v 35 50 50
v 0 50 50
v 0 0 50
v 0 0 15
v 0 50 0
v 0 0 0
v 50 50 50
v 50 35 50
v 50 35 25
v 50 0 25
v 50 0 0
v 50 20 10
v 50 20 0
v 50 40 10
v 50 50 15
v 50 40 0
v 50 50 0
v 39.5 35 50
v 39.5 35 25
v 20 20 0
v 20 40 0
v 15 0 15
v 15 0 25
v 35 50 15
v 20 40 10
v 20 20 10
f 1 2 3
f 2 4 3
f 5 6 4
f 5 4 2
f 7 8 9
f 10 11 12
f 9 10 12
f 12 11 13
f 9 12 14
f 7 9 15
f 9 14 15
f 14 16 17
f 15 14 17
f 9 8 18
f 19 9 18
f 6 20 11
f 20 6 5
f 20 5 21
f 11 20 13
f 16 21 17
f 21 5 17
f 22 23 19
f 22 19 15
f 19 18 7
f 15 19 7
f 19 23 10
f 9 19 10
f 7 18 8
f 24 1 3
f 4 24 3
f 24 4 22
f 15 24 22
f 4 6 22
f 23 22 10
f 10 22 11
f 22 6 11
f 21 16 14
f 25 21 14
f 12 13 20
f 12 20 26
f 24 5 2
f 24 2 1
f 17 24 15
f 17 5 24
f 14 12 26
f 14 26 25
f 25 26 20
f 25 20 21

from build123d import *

# Parameters (mm, degrees)
F0_W     = 50
F0_H     = 50
F1_DEPTH = 50
F3_DEPTH = 35
F4_W     = 20
F4_H     = 10
F5_DEPTH = 30
F7_DEPTH = 25


with BuildPart() as f1:
    # F0 (on Top) → F1 (new body)
    with BuildSketch(Plane.XY):
        with Locations((25, 25)):
            Rectangle(F0_W, F0_H)
    extrude(amount=F1_DEPTH)

    # F2 (on face) → F3 (cut)
    with BuildSketch(Plane.XY.offset(50)):
        Polygon((15, 0), (50, 50), (35, 50), (0, 0), align=None)
    extrude(amount=-F3_DEPTH, mode=Mode.SUBTRACT)

    # F4 (on face) → F5 (cut)
    with BuildSketch(Plane.YZ.offset(50)):
        with Locations((30, 5)):
            Rectangle(F4_W, F4_H)
    extrude(amount=-F5_DEPTH, mode=Mode.SUBTRACT)

    # F6 (on face) → F7 (cut)
    with BuildSketch(Plane.XY.offset(50)):
        Polygon((50, 35), (39.5, 35), (15, 0), (50, 0), align=None)
    extrude(amount=-F7_DEPTH, mode=Mode.SUBTRACT)


solid = f1.part
